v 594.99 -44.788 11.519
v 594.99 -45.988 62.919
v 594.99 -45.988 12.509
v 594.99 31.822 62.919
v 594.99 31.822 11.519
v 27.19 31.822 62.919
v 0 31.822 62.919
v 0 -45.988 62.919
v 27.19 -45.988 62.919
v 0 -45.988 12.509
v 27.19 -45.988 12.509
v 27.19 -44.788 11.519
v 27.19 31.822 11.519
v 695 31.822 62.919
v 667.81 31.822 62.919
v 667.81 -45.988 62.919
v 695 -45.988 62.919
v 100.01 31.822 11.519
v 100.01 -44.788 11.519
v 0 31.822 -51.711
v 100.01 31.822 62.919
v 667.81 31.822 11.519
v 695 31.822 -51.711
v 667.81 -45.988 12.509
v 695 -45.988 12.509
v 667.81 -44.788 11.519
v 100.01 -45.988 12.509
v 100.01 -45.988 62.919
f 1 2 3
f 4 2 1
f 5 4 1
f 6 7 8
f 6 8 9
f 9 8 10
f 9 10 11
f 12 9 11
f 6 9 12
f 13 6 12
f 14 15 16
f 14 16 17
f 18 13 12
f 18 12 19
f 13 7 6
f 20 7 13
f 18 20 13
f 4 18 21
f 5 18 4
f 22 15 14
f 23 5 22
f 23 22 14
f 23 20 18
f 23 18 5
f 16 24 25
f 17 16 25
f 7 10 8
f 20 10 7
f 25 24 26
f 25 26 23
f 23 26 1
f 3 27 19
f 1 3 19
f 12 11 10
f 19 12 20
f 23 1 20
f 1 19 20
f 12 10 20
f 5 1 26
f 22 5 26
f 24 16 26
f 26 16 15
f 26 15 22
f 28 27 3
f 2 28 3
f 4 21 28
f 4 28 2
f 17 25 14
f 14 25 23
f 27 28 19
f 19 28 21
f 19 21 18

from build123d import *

# Parameters (mm, degrees)
EXTRUDE_1_DEPTH     = 695
SKETCH_2_W          = 695
SKETCH_2_H          = 77.81
EXTRUDE_2_DEPTH     = 50.41
SKETCH_9_W          = 72.82
SKETCH_9_H          = 51.4
CUT_EXTRUDE_3_DEPTH = 1000
SKETCH_10_W         = 72.82
SKETCH_10_H         = 51.4
CUT_EXTRUDE_4_DEPTH = 1000


with BuildPart() as part:
    # 草图1 → 凸台-拉伸1 (new body)
    with BuildSketch(Plane(origin=(0, 0, 0), x_dir=(0, 0, -1), z_dir=(1, 0, 0))):
        Polygon((51.711180709, 31.822265051), (-12.508819291, 31.822265051), (-12.508819291, -45.987734949), align=None)
    extrude(amount=EXTRUDE_1_DEPTH)

    # 草图2 → 凸台-拉伸2 (add)
    with BuildSketch(Plane.XY.offset(12.508819291)):
        with Locations((347.5, -7.082734949)):
            Rectangle(SKETCH_2_W, SKETCH_2_H)
    extrude(amount=EXTRUDE_2_DEPTH)

    # 草图9 → 切除-拉伸3 (cut)
    with BuildSketch(Plane(origin=(0, 31.822265051, 0), x_dir=(1, 0, 0), z_dir=(0, 1, 0))):
        with Locations((63.6, -37.218819291)):
            Rectangle(SKETCH_9_W, SKETCH_9_H)
    extrude(amount=-CUT_EXTRUDE_3_DEPTH, mode=Mode.SUBTRACT)

    # 草图10 → 切除-拉伸4 (cut)
    with BuildSketch(Plane(origin=(0, 31.822265051, 0), x_dir=(1, 0, 0), z_dir=(0, 1, 0))):
        with Locations((631.4, -37.218819291)):
            Rectangle(SKETCH_10_W, SKETCH_10_H)
    extrude(amount=-CUT_EXTRUDE_4_DEPTH, mode=Mode.SUBTRACT)


solid = part.part
